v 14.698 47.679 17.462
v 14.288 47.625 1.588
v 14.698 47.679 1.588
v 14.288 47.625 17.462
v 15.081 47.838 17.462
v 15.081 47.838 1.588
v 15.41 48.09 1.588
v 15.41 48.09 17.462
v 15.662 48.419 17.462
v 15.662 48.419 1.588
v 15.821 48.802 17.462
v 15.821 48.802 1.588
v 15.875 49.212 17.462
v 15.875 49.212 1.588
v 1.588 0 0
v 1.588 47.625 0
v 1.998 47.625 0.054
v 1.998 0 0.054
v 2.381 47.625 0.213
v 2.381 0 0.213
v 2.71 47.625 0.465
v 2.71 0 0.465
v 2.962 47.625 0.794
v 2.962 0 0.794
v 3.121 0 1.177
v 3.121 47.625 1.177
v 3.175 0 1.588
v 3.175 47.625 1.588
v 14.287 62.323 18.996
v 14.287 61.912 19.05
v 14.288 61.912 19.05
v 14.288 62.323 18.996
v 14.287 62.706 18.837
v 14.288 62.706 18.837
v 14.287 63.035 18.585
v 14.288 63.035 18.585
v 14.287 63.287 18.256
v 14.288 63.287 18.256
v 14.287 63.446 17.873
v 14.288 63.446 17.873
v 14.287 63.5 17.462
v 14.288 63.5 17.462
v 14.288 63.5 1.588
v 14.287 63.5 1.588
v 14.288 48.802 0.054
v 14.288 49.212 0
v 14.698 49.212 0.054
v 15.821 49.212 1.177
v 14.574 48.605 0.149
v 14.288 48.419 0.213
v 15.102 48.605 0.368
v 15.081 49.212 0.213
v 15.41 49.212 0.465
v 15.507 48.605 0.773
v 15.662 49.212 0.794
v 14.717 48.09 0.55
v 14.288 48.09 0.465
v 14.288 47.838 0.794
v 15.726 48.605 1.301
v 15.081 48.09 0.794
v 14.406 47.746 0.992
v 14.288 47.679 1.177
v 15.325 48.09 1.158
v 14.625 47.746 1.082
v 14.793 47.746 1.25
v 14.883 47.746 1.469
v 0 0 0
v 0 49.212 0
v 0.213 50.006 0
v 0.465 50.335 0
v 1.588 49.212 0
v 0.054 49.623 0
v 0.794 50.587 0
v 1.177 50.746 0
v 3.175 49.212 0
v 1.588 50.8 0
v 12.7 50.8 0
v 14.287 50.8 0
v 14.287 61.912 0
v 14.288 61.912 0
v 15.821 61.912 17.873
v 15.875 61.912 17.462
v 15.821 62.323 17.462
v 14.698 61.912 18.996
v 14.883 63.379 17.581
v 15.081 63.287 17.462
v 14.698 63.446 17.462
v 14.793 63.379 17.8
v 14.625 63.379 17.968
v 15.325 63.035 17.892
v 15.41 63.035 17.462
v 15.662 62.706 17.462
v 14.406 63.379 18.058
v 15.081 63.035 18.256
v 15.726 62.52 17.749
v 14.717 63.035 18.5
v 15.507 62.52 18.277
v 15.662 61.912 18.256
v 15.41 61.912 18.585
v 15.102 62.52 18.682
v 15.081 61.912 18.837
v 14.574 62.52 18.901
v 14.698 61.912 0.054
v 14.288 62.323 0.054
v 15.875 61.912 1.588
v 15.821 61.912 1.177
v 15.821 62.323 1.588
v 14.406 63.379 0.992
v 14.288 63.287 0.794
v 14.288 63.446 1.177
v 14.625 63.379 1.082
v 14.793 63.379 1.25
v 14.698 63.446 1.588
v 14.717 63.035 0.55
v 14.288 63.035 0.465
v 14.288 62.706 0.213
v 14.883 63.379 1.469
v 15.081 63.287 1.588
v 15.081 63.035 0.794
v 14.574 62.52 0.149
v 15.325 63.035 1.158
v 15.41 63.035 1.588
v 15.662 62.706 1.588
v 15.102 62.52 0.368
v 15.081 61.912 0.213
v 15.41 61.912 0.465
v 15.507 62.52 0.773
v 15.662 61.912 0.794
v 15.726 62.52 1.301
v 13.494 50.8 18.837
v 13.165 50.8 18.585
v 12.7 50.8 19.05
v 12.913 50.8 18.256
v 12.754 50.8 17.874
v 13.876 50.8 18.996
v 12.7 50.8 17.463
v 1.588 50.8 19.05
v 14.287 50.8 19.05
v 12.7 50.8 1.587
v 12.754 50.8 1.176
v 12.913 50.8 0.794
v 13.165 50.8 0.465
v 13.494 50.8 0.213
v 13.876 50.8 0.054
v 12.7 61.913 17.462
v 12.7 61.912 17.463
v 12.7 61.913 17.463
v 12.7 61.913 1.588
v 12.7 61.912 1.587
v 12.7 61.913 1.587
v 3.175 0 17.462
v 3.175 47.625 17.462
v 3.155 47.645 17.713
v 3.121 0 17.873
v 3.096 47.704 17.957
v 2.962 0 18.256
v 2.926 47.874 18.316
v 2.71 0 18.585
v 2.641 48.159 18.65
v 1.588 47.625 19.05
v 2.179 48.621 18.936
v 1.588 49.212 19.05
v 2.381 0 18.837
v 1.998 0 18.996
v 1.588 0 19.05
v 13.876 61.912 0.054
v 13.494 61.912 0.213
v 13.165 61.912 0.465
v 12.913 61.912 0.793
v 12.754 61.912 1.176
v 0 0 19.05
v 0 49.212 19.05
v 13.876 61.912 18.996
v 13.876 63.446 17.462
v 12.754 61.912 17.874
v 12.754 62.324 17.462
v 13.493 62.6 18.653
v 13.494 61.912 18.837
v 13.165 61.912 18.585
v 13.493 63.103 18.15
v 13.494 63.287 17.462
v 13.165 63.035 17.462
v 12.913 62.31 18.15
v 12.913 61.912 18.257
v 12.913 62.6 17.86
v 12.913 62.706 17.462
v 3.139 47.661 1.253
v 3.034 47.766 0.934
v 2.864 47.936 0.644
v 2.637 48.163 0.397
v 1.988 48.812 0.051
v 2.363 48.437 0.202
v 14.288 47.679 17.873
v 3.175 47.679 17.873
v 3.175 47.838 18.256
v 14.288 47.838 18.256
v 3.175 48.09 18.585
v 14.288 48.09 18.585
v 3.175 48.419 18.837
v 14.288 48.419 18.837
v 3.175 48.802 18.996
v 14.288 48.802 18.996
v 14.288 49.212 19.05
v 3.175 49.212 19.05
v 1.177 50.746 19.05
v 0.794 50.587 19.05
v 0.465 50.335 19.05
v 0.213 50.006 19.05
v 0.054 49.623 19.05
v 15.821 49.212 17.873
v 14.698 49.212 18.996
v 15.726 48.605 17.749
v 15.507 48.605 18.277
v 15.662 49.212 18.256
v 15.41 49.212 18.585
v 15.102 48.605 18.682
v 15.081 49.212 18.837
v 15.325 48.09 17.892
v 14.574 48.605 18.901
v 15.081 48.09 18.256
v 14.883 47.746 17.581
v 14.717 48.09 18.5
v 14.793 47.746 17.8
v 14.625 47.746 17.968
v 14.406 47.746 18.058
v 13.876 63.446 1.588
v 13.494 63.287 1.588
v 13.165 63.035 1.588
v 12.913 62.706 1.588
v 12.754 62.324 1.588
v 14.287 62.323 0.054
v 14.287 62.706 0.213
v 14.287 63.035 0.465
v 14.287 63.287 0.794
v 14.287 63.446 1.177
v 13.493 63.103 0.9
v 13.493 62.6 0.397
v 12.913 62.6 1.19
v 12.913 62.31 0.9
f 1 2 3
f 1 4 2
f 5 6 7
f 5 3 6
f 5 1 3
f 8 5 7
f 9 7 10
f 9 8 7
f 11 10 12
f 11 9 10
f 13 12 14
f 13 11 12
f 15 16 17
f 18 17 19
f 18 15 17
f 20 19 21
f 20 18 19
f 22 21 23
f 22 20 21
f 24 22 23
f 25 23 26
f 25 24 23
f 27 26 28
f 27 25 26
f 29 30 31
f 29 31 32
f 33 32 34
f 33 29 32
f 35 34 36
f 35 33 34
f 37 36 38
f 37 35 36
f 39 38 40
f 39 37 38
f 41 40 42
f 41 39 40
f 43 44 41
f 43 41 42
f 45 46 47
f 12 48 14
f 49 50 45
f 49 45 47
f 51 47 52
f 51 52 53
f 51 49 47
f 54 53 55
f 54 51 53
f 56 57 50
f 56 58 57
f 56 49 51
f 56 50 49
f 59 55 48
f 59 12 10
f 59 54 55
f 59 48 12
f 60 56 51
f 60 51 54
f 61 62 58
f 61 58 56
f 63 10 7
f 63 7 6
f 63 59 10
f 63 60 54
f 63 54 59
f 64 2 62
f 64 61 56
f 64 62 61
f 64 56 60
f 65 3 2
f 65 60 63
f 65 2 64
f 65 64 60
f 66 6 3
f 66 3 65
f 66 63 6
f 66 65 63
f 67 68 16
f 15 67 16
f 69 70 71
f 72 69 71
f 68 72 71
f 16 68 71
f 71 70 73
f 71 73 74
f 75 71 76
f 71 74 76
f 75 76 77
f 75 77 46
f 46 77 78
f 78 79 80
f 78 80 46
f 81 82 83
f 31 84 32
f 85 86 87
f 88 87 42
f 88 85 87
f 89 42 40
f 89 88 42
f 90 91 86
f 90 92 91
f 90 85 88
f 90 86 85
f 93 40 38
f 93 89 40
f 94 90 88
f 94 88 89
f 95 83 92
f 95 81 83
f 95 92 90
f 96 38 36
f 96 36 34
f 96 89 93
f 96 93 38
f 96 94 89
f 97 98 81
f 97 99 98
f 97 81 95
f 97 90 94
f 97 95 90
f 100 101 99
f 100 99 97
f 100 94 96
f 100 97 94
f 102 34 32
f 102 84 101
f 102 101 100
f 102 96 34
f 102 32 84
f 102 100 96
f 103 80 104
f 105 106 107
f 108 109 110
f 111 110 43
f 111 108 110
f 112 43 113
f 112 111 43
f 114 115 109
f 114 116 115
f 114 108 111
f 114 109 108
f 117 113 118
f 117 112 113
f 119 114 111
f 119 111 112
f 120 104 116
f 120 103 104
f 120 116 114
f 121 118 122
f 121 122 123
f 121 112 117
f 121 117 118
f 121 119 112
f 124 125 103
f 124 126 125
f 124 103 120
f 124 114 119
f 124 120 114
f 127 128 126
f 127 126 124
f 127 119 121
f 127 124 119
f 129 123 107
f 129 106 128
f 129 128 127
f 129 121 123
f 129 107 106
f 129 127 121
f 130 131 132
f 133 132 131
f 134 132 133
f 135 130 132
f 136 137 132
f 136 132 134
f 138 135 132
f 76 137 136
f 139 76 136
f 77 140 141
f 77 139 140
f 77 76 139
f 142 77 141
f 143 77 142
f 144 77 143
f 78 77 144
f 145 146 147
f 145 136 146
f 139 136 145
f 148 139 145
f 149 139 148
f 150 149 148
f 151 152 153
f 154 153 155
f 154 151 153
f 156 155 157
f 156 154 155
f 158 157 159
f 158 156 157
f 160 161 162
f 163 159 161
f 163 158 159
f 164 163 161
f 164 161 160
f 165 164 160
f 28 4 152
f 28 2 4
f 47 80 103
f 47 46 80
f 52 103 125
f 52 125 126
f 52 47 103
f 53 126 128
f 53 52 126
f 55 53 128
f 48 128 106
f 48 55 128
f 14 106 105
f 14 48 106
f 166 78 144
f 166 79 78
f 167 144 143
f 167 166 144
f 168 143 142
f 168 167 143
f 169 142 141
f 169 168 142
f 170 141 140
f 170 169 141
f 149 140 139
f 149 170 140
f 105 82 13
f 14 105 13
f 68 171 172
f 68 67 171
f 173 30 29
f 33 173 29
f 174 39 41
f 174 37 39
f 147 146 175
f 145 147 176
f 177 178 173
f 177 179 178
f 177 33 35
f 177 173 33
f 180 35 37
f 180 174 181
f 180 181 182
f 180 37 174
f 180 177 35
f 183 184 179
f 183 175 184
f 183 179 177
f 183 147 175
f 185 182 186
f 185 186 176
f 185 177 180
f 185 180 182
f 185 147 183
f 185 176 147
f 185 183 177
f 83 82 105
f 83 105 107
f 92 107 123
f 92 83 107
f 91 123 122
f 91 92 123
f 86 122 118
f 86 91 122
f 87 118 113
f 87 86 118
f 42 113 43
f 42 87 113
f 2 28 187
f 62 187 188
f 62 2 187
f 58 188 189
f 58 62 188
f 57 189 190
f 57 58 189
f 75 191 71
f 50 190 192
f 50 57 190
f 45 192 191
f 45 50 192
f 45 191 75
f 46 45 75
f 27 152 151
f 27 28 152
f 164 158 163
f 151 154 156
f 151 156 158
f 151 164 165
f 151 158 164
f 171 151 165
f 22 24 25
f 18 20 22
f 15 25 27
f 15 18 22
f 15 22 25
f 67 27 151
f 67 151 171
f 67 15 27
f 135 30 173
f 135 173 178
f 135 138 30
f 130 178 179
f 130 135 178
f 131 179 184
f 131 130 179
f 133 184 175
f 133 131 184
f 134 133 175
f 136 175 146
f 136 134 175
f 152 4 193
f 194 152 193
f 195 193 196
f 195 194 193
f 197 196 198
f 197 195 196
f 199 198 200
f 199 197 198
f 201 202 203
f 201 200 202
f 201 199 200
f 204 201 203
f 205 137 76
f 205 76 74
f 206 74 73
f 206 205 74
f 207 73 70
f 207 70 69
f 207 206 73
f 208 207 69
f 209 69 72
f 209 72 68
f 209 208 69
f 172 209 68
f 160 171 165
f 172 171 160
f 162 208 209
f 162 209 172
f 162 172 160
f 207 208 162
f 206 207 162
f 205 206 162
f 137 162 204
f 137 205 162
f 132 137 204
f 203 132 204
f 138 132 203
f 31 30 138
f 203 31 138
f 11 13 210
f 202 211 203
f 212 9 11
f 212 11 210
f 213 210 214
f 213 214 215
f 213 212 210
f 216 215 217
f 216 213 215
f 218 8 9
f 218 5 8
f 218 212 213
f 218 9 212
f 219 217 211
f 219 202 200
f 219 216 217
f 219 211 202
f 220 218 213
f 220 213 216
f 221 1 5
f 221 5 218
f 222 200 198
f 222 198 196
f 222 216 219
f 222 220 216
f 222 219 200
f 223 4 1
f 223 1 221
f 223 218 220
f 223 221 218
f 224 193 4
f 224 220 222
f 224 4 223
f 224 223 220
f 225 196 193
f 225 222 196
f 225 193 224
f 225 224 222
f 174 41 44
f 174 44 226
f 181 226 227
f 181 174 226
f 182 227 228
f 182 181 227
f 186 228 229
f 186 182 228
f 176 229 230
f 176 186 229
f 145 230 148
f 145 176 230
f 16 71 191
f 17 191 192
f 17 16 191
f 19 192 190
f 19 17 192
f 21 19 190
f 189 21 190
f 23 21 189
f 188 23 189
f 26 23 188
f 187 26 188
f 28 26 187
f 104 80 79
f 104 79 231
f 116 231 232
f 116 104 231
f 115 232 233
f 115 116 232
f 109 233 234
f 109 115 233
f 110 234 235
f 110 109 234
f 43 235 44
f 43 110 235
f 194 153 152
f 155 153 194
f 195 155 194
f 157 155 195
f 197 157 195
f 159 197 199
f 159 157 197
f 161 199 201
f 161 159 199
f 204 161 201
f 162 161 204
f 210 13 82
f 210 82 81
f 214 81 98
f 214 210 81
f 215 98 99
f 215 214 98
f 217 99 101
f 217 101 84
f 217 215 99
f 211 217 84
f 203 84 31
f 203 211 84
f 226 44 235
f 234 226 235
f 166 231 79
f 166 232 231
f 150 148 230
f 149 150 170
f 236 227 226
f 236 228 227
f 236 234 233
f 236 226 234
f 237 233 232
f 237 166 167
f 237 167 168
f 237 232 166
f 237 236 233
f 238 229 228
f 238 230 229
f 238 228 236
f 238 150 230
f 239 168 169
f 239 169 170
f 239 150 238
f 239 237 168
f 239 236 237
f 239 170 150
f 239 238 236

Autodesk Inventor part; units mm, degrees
ref_plane "YZ Plane" through (0, 0, 0) normal (1, 0, 0) x (0, 1, 0)
ref_plane "XZ Plane" through (0, 0, 0) normal (0, 1, 0) x (-1, 0, 0)
ref_plane "XY Plane" through (0, 0, 0) normal (0, 0, 1) x (1, 0, 0)
sketch "Sketch1" plane through (0, 0, 0) normal (0, 0, 1) x (1, 0, 0)
  line L0 (0, 0) -> (0, 50.8)
  line L1 (0, 50.8) -> (12.7, 50.8)
  line L2 (12.7, 50.8) -> (12.7, 63.5)
  line L3 (12.7, 63.5) -> (15.875, 63.5)
  line L4 (15.875, 63.5) -> (15.875, 47.625)
  line L5 (15.875, 47.625) -> (3.175, 47.625)
  line L6 (3.175, 47.625) -> (3.175, 0)
  line L7 (3.175, 0) -> (0, 0)
extrude "Extrusion1" add sketch "Sketch1" along normal blind 19.05
fillet "Fillet1" radius 1.5875 1 edges at (15.875, 55.5625, 19.05)
fillet "Fillet2" radius 1.5875 1 edges at (15.875, 55.5625, 0)
fillet "Fillet3" radius 1.5875 5 edges at (15.875, 63.5, 9.525) (15.41, 63.5, 18.585) (13.4938, 63.5, 19.05) (15.41, 63.5, 0.465) (13.4938, 63.5, 0)
fillet "Fillet4" radius 1.5875 5 edges at (12.7, 63.5, 9.525) (12.7, 63.035, 18.585) (12.7, 56.3563, 19.05) (12.7, 63.035, 0.465) (12.7, 56.3563, 0)
fillet "Fillet5" radius 1.5875 1 edges at (0, 50.8, 9.525)
fillet "Fillet6" radius 1.5875 1 edges at (3.175, 23.8125, 19.05)
fillet "Fillet7" radius 1.5875 5 edges at (8.7312, 47.625, 19.05) (15.41, 47.625, 18.585) (15.875, 47.625, 9.525) (15.41, 47.625, 0.465) (8.7312, 47.625, 0)
fillet "Fillet8" radius 1.5875 1 edges at (3.175, 23.8125, 0)
properties part number "Z-Clip"
